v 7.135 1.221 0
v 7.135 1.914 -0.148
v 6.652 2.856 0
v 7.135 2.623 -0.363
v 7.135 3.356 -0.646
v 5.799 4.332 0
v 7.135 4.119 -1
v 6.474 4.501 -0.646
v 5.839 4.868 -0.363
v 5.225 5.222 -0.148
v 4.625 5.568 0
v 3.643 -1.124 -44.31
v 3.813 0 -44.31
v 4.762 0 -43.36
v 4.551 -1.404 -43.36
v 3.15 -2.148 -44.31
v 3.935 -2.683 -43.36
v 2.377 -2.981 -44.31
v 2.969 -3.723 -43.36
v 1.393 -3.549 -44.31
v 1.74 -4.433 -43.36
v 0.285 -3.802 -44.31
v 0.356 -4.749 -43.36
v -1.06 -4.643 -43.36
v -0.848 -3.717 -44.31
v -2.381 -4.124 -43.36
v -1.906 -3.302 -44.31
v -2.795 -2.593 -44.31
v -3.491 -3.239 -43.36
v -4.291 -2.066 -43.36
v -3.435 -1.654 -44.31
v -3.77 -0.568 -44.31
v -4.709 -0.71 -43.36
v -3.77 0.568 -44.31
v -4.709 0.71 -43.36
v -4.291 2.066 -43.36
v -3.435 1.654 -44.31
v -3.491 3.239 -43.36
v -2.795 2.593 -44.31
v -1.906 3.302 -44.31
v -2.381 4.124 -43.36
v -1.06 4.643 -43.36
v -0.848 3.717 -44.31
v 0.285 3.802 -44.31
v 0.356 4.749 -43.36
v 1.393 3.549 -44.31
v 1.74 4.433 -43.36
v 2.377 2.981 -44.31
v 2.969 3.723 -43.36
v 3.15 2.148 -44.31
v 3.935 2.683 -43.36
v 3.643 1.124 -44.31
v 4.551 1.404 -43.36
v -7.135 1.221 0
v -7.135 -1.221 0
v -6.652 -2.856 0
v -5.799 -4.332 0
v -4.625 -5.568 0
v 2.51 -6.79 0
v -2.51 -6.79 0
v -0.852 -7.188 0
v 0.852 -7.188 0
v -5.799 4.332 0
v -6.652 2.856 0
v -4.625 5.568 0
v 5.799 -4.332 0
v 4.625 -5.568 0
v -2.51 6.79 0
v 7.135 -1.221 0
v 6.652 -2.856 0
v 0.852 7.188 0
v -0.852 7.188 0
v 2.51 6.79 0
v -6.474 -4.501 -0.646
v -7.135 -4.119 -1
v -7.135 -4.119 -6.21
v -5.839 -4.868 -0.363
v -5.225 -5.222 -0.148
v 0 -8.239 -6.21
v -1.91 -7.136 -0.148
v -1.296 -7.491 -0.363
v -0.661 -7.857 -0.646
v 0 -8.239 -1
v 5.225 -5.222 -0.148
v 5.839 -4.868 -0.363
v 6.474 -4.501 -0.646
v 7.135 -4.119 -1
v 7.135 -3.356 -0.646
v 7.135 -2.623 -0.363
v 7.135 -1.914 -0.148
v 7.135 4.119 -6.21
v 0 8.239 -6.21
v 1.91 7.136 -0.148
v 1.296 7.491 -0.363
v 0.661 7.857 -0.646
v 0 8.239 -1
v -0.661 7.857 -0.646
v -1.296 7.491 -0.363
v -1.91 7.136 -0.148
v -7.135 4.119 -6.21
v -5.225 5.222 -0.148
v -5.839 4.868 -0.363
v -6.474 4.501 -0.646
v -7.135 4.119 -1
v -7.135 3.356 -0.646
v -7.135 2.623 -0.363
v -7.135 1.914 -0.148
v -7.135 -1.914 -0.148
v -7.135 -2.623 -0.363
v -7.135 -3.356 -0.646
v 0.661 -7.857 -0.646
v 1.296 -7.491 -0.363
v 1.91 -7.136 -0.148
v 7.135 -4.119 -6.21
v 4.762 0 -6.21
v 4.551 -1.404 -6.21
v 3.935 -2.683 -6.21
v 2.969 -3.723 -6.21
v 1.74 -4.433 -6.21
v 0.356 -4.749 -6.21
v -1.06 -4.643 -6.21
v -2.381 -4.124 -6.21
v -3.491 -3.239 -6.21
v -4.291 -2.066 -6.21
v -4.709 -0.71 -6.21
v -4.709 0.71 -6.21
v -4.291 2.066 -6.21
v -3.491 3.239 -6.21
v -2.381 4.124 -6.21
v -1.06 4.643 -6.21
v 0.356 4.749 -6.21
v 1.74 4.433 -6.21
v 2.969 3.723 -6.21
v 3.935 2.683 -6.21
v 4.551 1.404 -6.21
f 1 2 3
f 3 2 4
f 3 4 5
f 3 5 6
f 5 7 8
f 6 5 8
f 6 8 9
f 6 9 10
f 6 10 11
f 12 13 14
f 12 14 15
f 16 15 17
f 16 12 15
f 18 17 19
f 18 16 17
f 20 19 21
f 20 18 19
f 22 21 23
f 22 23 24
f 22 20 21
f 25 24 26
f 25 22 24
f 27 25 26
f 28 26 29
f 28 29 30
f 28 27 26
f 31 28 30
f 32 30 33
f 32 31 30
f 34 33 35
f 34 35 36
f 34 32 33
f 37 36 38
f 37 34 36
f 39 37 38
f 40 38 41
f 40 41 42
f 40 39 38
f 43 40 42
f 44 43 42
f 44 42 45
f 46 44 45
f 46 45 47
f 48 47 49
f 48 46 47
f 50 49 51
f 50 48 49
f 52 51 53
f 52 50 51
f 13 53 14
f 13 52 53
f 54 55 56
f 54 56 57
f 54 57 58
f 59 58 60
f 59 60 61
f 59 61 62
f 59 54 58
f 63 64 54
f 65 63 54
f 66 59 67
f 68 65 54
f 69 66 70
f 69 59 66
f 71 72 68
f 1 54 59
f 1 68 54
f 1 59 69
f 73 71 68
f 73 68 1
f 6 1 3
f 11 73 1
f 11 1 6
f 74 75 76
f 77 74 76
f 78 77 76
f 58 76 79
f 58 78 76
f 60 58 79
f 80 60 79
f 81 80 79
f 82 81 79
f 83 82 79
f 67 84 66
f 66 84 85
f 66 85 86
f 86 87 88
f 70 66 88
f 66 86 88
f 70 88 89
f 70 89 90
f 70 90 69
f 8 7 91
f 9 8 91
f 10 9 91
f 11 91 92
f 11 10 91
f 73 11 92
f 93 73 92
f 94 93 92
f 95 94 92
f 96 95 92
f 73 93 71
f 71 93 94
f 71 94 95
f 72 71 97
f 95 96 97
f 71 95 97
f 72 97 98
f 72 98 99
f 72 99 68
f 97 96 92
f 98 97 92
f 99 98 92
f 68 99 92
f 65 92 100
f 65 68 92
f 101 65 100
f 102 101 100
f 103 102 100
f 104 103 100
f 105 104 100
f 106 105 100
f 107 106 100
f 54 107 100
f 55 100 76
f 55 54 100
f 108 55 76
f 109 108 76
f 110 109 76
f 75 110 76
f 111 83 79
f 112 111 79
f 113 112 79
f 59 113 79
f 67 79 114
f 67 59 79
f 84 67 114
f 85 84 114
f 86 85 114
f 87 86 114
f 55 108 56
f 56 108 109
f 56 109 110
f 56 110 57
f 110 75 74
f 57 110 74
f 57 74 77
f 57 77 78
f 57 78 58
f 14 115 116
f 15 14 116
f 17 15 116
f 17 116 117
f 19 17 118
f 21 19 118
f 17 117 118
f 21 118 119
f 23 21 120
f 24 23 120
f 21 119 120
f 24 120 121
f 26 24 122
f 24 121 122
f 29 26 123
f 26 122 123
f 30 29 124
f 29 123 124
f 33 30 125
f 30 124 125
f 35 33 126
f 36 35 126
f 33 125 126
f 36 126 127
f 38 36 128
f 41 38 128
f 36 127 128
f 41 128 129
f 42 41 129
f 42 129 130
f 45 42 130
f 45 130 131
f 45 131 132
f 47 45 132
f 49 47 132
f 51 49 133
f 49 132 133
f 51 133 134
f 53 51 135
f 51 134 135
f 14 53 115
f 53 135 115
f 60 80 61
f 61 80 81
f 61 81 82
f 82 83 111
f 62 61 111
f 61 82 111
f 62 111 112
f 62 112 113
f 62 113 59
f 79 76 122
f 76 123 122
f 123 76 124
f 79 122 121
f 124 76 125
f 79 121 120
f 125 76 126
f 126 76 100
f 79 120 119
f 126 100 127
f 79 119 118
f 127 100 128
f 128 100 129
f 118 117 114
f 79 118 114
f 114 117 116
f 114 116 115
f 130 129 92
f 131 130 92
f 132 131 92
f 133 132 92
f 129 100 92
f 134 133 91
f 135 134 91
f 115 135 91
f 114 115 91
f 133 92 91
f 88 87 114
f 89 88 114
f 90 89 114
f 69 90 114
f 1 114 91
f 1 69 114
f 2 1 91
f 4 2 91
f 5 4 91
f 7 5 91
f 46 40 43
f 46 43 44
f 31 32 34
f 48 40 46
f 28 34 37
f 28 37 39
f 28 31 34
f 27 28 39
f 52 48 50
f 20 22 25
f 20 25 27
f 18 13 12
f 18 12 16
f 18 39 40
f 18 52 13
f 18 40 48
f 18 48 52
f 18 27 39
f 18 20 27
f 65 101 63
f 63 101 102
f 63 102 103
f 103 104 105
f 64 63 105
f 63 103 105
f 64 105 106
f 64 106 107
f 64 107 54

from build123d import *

# Parameters (mm, degrees)
F1_DEPTH = 6.21
F2_R     = 4.7625
F3_DEPTH = 38.1
F4_SIZE2 = 0.95
F4_SIZE  = 0.95


with BuildPart() as f1:
    # F0 (on Top) → F1 (new body)
    with BuildSketch(Plane.XY):
        Polygon((7.135, 4.119394), (0, 8.238788), (-7.135, 4.119394), (-7.135, -4.119394), (0, -8.238788), (7.135, -4.119394), align=None)
    extrude(amount=-F1_DEPTH)

    # F2 (on face) → F3 (join)
    with BuildSketch(Plane(origin=(0, 0, -6.21), x_dir=(1, 0, 0), z_dir=(0, 0, -1))):
        Circle(F2_R)
    extrude(amount=F3_DEPTH)

    # F4
    f4_edges = [f1.edges().sort_by_distance(p)[0] for p in [
        (-4.7625, 0, -44.31),
    ]]
    chamfer(f4_edges, length=F4_SIZE, length2=F4_SIZE2)

    # F5 (on Right) → F6 (revolve, cut)
    with BuildSketch(Plane.YZ):
        Polygon((8.238788, 0), (7.238788, 0), (8.238788, -1), align=None)
    revolve(axis=Axis((0, 0, -6.21), (0, 0, 1)), mode=Mode.SUBTRACT)


solid = f1.part
